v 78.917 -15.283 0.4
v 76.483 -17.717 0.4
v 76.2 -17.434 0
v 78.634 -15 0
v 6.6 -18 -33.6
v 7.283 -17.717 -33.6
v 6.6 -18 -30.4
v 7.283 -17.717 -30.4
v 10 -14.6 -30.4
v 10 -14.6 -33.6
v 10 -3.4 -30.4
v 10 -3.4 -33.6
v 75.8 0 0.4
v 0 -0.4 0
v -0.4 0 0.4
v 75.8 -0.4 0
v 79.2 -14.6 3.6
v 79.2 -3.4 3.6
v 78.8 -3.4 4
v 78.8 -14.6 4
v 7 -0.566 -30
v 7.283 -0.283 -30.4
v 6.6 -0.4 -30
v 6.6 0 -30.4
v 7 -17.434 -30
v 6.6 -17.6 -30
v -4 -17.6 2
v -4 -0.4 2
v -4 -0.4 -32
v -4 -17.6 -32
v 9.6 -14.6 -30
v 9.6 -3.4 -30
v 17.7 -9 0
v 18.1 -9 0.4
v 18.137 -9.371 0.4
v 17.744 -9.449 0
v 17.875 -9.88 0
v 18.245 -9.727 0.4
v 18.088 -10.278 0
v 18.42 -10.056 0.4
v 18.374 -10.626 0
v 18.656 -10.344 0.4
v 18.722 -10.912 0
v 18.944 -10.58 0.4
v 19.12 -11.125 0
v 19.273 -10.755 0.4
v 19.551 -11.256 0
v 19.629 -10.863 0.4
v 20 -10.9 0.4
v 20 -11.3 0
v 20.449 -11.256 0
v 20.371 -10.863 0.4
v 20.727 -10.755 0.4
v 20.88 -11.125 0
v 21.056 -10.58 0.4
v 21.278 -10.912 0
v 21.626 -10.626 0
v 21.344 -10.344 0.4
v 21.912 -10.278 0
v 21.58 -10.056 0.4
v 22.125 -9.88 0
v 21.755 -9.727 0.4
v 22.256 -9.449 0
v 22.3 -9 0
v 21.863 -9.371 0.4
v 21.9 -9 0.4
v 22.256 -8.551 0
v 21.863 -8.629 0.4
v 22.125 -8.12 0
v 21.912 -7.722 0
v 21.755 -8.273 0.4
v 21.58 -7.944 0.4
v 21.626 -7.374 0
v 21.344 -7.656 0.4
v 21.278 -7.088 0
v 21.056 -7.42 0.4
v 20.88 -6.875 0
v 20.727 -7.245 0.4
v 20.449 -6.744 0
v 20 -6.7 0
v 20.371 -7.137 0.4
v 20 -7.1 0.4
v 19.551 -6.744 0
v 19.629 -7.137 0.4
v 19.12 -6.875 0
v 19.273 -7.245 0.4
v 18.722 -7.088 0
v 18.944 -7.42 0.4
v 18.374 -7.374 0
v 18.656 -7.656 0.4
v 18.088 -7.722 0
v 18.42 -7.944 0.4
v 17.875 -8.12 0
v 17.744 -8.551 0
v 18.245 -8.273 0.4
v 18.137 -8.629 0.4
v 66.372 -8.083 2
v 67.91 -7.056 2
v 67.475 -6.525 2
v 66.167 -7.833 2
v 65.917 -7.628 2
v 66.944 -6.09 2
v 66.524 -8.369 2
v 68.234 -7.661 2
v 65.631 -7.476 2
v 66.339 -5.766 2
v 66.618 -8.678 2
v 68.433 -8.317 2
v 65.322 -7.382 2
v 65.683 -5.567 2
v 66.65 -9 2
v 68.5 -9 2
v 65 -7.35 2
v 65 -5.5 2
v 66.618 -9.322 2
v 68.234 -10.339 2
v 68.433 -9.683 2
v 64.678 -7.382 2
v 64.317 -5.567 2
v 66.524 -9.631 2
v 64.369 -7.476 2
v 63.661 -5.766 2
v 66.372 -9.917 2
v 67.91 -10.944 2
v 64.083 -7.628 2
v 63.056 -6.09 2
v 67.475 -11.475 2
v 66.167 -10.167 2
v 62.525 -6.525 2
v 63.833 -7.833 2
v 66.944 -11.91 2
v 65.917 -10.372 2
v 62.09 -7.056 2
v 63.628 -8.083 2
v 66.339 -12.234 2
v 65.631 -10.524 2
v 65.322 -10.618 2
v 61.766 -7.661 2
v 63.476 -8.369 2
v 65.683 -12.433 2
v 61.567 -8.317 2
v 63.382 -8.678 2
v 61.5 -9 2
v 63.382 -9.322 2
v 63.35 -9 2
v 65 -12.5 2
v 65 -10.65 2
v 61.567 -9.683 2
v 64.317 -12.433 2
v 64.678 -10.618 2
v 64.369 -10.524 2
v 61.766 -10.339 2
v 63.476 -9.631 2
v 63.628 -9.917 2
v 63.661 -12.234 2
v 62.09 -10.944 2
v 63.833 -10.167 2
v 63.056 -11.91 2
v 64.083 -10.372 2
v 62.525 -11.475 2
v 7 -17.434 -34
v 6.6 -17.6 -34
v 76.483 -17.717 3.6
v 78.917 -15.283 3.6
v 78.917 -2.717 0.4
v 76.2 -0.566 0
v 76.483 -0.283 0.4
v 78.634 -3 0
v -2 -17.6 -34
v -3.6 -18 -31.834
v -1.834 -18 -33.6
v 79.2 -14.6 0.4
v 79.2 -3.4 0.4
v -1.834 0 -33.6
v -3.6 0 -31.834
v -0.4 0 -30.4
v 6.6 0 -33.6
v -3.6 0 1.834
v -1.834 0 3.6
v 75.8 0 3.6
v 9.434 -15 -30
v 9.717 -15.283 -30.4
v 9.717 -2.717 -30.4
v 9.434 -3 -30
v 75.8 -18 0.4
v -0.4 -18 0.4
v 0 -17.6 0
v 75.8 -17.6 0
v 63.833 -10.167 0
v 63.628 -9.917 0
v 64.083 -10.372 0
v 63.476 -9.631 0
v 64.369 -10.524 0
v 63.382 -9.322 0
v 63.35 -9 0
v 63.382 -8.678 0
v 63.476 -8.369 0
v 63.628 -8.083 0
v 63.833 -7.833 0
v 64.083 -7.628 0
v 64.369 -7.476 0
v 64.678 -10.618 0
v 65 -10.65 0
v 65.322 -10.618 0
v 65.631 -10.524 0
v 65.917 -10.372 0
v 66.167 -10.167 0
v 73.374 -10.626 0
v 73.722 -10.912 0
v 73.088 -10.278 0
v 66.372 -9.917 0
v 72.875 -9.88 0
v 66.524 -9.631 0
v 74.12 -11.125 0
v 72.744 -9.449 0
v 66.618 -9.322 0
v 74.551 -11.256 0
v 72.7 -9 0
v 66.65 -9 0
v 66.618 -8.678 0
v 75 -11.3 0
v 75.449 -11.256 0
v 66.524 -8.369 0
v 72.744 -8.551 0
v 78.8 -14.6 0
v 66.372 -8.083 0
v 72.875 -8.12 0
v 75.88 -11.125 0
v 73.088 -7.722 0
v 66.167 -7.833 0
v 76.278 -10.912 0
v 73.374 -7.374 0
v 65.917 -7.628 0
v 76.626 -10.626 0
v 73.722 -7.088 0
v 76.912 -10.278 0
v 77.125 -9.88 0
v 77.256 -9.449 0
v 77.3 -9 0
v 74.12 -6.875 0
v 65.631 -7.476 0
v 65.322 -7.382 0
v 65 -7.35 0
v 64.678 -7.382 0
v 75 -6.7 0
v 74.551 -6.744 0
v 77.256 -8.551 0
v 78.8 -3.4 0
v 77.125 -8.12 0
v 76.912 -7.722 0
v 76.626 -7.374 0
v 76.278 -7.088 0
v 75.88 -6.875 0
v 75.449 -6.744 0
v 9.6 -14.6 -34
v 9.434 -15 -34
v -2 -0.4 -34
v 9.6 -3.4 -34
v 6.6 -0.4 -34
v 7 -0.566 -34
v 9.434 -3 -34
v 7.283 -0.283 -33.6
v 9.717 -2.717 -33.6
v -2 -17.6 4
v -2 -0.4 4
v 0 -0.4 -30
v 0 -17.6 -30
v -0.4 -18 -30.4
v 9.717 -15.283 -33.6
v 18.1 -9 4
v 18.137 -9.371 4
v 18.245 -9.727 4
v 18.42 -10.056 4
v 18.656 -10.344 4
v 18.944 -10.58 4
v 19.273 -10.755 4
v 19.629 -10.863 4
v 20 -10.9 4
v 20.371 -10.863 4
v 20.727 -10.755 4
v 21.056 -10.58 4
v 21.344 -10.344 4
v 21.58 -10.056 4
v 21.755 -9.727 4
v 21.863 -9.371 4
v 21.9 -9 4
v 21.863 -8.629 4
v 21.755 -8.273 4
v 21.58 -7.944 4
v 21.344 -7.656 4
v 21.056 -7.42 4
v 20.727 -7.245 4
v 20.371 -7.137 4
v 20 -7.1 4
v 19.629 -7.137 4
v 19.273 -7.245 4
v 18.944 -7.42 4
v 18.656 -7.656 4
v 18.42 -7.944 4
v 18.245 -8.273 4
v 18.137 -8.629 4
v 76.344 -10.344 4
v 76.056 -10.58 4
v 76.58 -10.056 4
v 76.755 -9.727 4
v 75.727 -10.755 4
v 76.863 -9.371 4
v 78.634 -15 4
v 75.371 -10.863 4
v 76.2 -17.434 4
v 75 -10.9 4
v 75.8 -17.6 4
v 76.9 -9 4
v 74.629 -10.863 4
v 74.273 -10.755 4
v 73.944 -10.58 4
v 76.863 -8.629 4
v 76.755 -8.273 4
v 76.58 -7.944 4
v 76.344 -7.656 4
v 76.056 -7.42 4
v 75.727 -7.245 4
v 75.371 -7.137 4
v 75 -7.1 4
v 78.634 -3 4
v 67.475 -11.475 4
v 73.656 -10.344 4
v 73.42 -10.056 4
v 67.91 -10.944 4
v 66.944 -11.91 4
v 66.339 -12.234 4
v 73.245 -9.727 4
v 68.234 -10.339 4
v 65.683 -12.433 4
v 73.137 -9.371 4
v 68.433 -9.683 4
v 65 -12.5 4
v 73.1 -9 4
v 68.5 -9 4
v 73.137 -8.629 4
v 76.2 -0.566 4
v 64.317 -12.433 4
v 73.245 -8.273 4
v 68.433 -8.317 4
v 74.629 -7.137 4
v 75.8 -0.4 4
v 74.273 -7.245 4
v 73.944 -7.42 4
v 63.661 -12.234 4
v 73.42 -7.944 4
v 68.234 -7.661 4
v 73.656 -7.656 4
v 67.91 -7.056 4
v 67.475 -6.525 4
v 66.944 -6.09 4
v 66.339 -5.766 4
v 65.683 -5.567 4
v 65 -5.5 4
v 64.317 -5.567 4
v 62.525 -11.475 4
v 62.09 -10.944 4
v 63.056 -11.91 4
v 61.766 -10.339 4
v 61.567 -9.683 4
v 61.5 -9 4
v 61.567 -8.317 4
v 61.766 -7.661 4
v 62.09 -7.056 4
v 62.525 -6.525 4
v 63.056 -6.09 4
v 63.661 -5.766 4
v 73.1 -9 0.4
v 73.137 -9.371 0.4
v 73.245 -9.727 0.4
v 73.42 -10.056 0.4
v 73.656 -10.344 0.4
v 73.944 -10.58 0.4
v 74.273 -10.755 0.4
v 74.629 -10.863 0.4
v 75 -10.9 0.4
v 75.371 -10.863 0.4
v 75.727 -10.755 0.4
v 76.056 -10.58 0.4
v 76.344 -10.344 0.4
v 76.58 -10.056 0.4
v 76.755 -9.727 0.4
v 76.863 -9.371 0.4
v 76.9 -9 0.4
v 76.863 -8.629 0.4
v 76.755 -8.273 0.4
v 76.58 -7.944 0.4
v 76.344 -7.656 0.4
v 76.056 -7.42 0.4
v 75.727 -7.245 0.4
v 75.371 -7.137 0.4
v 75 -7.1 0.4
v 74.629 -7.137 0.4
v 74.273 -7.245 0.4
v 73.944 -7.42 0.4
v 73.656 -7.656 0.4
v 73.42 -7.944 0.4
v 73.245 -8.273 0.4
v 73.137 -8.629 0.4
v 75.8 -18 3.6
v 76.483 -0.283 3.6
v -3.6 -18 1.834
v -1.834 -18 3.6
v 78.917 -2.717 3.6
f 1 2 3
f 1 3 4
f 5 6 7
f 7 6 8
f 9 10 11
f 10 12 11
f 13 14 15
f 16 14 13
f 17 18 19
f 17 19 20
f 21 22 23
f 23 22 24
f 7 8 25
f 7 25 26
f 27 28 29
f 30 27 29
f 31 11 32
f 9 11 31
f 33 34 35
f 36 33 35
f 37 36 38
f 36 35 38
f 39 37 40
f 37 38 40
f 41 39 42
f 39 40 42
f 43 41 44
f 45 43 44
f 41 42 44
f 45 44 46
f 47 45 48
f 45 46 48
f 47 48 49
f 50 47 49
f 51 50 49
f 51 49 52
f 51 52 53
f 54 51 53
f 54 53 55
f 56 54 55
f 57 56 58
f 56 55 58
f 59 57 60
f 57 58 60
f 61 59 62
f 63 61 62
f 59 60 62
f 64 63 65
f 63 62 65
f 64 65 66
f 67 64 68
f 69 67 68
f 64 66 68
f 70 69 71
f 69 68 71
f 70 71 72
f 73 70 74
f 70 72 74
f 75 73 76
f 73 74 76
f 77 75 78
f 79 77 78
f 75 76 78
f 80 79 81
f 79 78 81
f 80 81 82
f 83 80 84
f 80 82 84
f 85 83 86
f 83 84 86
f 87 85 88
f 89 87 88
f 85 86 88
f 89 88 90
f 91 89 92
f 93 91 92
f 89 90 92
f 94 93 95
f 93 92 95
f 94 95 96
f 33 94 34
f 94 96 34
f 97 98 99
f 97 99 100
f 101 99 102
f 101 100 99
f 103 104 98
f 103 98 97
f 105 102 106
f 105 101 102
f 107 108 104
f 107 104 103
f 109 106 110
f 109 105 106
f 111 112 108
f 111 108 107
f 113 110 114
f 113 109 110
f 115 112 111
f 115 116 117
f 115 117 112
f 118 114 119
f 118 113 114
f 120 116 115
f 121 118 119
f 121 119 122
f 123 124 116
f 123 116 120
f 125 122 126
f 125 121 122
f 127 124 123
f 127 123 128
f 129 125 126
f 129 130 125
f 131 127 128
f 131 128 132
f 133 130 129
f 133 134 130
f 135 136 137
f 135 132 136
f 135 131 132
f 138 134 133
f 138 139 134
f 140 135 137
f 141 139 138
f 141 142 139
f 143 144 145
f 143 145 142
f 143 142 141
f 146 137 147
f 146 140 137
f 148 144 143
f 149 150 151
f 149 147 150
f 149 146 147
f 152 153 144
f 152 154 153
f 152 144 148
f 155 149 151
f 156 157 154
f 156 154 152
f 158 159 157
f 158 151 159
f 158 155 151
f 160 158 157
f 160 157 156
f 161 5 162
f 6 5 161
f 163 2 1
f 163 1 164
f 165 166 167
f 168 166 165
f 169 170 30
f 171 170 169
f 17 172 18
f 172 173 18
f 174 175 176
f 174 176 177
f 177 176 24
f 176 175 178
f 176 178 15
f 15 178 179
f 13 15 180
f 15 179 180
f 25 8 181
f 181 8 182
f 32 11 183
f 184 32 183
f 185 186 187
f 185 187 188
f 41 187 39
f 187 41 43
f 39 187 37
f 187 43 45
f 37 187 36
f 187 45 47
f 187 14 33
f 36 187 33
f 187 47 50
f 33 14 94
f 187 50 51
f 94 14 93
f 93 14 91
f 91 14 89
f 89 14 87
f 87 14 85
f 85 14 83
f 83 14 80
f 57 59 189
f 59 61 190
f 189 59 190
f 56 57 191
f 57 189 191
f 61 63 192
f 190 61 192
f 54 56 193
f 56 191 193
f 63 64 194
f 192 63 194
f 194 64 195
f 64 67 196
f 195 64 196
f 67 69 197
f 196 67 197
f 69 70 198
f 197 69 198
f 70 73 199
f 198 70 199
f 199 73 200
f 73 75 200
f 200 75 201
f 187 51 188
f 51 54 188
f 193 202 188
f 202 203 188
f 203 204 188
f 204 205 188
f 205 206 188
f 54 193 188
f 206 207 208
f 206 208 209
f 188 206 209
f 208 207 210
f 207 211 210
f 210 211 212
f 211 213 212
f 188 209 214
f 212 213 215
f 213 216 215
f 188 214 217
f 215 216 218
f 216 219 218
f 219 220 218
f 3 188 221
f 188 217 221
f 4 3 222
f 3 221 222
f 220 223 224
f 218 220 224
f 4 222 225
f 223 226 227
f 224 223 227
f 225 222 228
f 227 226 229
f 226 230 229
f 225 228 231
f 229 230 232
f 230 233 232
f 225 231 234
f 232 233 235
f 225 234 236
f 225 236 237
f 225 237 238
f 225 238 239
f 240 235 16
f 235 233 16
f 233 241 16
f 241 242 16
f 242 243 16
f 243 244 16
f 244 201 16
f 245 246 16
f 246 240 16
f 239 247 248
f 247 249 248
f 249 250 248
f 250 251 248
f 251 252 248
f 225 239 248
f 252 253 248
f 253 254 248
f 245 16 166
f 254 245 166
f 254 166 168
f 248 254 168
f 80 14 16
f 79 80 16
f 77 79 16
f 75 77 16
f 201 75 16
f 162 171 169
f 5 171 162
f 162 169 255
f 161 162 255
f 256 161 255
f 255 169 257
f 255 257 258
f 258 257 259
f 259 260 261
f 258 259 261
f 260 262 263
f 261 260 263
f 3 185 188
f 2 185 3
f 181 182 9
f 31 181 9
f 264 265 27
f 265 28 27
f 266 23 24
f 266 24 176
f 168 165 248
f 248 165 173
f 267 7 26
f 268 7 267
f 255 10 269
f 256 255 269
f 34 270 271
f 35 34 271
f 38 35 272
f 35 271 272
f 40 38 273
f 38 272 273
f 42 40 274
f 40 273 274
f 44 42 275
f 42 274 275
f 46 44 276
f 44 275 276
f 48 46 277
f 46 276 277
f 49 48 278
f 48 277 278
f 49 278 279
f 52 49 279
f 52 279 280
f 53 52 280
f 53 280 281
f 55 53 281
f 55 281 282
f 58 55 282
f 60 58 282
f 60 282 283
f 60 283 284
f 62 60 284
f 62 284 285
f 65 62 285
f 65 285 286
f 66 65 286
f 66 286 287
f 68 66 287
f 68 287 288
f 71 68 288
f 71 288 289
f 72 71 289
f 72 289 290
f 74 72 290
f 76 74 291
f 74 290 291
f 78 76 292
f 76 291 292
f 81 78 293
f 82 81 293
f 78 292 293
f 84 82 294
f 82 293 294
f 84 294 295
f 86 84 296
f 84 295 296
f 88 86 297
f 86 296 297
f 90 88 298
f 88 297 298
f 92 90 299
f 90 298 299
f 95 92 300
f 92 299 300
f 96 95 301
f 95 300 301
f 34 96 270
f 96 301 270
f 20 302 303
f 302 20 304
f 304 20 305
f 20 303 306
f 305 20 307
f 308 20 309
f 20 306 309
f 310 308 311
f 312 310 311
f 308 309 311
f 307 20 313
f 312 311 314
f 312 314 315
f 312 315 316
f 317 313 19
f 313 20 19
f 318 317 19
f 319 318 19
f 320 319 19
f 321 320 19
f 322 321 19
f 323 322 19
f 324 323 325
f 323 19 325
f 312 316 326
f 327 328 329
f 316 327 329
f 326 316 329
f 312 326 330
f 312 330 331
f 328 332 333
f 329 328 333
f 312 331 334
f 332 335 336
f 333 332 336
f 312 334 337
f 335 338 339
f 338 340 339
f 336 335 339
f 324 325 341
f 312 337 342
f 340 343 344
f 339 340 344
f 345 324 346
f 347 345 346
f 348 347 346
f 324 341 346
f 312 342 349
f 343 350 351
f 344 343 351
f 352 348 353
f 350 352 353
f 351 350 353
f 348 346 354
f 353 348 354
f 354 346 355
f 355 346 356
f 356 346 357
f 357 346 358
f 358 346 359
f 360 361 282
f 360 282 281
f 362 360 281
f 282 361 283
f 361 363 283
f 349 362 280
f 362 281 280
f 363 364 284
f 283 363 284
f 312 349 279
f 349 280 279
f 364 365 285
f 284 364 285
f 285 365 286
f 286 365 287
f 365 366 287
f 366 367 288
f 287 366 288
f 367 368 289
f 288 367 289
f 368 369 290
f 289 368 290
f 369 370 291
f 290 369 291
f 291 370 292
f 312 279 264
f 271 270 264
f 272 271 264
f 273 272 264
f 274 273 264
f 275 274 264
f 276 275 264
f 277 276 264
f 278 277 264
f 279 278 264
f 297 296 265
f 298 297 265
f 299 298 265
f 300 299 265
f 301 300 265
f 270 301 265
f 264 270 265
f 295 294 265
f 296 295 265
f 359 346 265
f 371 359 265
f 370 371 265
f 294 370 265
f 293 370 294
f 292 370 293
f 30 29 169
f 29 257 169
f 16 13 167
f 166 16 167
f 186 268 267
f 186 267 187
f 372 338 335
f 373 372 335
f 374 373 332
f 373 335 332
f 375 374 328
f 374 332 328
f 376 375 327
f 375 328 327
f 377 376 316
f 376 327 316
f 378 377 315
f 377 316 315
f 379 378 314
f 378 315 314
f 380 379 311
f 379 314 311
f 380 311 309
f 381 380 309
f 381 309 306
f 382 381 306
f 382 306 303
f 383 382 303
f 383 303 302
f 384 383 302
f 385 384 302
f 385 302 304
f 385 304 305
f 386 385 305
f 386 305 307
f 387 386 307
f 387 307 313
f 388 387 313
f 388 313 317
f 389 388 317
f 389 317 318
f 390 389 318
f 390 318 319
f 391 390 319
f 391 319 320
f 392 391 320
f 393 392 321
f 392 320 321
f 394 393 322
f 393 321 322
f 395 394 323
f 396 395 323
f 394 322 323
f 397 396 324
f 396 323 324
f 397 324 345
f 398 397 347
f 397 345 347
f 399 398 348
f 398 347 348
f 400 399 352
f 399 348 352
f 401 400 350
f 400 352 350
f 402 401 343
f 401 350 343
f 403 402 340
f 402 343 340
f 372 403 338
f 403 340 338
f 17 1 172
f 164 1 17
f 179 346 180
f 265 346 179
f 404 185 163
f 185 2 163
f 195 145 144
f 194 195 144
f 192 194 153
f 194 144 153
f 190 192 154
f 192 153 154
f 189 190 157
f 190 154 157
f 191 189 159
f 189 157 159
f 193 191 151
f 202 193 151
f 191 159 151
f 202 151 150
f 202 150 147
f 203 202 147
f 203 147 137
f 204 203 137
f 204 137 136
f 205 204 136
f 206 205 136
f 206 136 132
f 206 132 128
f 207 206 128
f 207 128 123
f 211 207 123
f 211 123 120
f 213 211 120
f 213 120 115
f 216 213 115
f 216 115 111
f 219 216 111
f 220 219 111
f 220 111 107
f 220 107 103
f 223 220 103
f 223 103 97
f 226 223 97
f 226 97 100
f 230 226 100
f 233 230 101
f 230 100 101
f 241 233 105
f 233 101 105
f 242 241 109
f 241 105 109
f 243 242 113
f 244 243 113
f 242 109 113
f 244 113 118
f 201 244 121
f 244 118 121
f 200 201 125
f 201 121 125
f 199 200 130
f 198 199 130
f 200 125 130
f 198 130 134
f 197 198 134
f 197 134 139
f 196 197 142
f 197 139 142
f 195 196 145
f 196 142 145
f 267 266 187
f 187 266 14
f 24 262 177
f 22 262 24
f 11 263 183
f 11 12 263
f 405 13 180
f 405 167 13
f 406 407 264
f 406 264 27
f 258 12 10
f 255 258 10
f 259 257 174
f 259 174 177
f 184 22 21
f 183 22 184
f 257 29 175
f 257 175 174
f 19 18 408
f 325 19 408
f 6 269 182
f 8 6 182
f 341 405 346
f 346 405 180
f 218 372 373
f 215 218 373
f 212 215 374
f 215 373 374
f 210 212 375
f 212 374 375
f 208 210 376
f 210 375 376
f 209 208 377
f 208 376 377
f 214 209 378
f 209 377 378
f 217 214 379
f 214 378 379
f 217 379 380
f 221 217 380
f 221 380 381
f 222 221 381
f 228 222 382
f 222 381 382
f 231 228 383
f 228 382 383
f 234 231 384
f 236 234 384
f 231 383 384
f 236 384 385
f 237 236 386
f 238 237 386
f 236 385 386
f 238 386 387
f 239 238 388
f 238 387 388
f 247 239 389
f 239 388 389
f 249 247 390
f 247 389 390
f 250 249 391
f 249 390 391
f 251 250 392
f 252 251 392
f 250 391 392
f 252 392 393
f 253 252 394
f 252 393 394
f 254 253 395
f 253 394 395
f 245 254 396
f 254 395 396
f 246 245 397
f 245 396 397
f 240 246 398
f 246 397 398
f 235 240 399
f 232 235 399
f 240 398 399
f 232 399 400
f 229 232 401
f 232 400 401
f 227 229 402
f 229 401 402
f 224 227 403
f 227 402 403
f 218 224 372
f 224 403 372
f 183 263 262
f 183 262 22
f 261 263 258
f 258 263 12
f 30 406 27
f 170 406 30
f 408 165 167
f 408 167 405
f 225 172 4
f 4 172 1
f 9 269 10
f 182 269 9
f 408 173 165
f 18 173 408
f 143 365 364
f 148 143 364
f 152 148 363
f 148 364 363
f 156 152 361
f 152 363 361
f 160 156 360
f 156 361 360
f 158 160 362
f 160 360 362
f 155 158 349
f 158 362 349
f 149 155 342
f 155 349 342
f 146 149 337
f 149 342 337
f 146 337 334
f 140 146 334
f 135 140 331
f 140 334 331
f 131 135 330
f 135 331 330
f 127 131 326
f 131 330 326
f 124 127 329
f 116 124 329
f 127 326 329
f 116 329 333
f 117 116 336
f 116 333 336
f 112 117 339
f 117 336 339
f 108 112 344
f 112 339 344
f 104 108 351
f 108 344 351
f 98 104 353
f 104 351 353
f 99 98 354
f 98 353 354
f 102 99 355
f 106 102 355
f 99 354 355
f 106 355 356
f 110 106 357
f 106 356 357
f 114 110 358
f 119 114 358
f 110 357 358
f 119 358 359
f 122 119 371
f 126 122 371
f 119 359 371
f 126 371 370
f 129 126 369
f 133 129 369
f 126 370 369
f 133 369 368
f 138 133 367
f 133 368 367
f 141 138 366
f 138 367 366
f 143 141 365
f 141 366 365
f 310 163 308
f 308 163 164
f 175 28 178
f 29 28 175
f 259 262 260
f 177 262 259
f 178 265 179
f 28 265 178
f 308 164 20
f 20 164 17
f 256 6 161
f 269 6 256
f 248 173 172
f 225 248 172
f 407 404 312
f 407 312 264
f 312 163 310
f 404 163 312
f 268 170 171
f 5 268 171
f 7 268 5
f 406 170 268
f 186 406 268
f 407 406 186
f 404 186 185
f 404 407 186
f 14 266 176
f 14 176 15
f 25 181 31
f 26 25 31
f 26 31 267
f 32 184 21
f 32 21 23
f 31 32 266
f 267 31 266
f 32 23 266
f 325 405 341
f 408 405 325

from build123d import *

# Parameters (mm, degrees)
PAD003_DEPTH       = 18
SKETCH010_R        = 1.9
SKETCH010_R_2      = 1.65
POCKET007_DEPTH    = 5
SKETCH011_R        = 3.5
POCKET008_DEPTH    = 2
CHAMFER012008_SIZE = 3
CHAMFER012009_SIZE = 2
CHAMFER012010_SIZE = 0.4
CHAMFER012011_SIZE = 0.4


with BuildPart() as part:
    # Sketch009 → Pad003 (new body)
    with BuildSketch(Plane.XZ):
        Polygon((0, 0), (79.2, 0), (79.2, 4), (-4, 4), (-4, -34), (10, -34), (10, -30), (0, -30), align=None)
    extrude(amount=PAD003_DEPTH)

    # Sketch010 (on Face3 of Pad003) → Pocket007 (cut)
    with BuildSketch(Plane(origin=(0, 0, 4), x_dir=(-1, 0, 0), z_dir=(0, 0, 1))):
        with Locations((-75, 9)):
            Circle(SKETCH010_R)
        with Locations((-65, 9)):
            Circle(SKETCH010_R_2)
        with Locations((-20, 9)):
            Circle(SKETCH010_R)
    extrude(amount=-POCKET007_DEPTH, mode=Mode.SUBTRACT)

    # Sketch011 (on Face10 of Pocket007) → Pocket008 (cut)
    with BuildSketch(Plane(origin=(0, 0, 4), x_dir=(-1, 0, 0), z_dir=(0, 0, 1))):
        with Locations((-65, 9)):
            Circle(SKETCH011_R)
    extrude(amount=-POCKET008_DEPTH, mode=Mode.SUBTRACT)

    # Chamfer012008
    chamfer012008_edges = [part.edges().sort_by_distance(p)[0] for p in [
        (10, -18, -32),
        (10, 0, -32),
        (79.2, -18, 2),
        (79.2, 0, 2),
    ]]
    chamfer(chamfer012008_edges, length=CHAMFER012008_SIZE)

    # Chamfer012009
    chamfer012009_edges = [part.edges().sort_by_distance(p)[0] for p in [
        (-4, -9, -34),
        (-4, -9, 4),
    ]]
    chamfer(chamfer012009_edges, length=CHAMFER012009_SIZE)

    # Chamfer012010
    chamfer012010_edges = [part.edges().sort_by_distance(p)[0] for p in [
        (8.5, -16.5, -34),
        (7, -18, -32),
        (10, -15, -32),
        (8.5, -16.5, -30),
        (10, -9, -34),
        (10, -3, -32),
        (10, -9, -30),
        (37.1, -18, 4),
        (-3, -18, 3),
        (76.2, -18, 2),
        (-4, -18, -15),
        (38.1, -18, 0),
        (-3, -18, -33),
        (0, -18, -15),
        (2.5, -18, -34),
        (3.5, -18, -30),
        (77.7, -16.5, 0),
        (79.2, -15, 2),
        (77.7, -16.5, 4),
        (79.2, -9, 0),
        (79.2, -3, 2),
        (79.2, -9, 4),
        (77.7, -1.5, 0),
        (76.2, 0, 2),
        (77.7, -1.5, 4),
        (37.1, 0, 4),
        (-3, 0, 3),
        (-4, 0, -15),
        (38.1, 0, 0),
        (-3, 0, -33),
        (0, 0, -15),
        (2.5, 0, -34),
        (3.5, 0, -30),
        (7, 0, -32),
        (8.5, -1.5, -34),
        (8.5, -1.5, -30),
    ]]
    chamfer(chamfer012010_edges, length=CHAMFER012010_SIZE)

    # Chamfer012011
    chamfer012011_edges = [part.edges().sort_by_distance(p)[0] for p in [
        (21.9, -9, 0),
        (76.9, -9, 0),
    ]]
    chamfer(chamfer012011_edges, length=CHAMFER012011_SIZE)


solid = part.part
